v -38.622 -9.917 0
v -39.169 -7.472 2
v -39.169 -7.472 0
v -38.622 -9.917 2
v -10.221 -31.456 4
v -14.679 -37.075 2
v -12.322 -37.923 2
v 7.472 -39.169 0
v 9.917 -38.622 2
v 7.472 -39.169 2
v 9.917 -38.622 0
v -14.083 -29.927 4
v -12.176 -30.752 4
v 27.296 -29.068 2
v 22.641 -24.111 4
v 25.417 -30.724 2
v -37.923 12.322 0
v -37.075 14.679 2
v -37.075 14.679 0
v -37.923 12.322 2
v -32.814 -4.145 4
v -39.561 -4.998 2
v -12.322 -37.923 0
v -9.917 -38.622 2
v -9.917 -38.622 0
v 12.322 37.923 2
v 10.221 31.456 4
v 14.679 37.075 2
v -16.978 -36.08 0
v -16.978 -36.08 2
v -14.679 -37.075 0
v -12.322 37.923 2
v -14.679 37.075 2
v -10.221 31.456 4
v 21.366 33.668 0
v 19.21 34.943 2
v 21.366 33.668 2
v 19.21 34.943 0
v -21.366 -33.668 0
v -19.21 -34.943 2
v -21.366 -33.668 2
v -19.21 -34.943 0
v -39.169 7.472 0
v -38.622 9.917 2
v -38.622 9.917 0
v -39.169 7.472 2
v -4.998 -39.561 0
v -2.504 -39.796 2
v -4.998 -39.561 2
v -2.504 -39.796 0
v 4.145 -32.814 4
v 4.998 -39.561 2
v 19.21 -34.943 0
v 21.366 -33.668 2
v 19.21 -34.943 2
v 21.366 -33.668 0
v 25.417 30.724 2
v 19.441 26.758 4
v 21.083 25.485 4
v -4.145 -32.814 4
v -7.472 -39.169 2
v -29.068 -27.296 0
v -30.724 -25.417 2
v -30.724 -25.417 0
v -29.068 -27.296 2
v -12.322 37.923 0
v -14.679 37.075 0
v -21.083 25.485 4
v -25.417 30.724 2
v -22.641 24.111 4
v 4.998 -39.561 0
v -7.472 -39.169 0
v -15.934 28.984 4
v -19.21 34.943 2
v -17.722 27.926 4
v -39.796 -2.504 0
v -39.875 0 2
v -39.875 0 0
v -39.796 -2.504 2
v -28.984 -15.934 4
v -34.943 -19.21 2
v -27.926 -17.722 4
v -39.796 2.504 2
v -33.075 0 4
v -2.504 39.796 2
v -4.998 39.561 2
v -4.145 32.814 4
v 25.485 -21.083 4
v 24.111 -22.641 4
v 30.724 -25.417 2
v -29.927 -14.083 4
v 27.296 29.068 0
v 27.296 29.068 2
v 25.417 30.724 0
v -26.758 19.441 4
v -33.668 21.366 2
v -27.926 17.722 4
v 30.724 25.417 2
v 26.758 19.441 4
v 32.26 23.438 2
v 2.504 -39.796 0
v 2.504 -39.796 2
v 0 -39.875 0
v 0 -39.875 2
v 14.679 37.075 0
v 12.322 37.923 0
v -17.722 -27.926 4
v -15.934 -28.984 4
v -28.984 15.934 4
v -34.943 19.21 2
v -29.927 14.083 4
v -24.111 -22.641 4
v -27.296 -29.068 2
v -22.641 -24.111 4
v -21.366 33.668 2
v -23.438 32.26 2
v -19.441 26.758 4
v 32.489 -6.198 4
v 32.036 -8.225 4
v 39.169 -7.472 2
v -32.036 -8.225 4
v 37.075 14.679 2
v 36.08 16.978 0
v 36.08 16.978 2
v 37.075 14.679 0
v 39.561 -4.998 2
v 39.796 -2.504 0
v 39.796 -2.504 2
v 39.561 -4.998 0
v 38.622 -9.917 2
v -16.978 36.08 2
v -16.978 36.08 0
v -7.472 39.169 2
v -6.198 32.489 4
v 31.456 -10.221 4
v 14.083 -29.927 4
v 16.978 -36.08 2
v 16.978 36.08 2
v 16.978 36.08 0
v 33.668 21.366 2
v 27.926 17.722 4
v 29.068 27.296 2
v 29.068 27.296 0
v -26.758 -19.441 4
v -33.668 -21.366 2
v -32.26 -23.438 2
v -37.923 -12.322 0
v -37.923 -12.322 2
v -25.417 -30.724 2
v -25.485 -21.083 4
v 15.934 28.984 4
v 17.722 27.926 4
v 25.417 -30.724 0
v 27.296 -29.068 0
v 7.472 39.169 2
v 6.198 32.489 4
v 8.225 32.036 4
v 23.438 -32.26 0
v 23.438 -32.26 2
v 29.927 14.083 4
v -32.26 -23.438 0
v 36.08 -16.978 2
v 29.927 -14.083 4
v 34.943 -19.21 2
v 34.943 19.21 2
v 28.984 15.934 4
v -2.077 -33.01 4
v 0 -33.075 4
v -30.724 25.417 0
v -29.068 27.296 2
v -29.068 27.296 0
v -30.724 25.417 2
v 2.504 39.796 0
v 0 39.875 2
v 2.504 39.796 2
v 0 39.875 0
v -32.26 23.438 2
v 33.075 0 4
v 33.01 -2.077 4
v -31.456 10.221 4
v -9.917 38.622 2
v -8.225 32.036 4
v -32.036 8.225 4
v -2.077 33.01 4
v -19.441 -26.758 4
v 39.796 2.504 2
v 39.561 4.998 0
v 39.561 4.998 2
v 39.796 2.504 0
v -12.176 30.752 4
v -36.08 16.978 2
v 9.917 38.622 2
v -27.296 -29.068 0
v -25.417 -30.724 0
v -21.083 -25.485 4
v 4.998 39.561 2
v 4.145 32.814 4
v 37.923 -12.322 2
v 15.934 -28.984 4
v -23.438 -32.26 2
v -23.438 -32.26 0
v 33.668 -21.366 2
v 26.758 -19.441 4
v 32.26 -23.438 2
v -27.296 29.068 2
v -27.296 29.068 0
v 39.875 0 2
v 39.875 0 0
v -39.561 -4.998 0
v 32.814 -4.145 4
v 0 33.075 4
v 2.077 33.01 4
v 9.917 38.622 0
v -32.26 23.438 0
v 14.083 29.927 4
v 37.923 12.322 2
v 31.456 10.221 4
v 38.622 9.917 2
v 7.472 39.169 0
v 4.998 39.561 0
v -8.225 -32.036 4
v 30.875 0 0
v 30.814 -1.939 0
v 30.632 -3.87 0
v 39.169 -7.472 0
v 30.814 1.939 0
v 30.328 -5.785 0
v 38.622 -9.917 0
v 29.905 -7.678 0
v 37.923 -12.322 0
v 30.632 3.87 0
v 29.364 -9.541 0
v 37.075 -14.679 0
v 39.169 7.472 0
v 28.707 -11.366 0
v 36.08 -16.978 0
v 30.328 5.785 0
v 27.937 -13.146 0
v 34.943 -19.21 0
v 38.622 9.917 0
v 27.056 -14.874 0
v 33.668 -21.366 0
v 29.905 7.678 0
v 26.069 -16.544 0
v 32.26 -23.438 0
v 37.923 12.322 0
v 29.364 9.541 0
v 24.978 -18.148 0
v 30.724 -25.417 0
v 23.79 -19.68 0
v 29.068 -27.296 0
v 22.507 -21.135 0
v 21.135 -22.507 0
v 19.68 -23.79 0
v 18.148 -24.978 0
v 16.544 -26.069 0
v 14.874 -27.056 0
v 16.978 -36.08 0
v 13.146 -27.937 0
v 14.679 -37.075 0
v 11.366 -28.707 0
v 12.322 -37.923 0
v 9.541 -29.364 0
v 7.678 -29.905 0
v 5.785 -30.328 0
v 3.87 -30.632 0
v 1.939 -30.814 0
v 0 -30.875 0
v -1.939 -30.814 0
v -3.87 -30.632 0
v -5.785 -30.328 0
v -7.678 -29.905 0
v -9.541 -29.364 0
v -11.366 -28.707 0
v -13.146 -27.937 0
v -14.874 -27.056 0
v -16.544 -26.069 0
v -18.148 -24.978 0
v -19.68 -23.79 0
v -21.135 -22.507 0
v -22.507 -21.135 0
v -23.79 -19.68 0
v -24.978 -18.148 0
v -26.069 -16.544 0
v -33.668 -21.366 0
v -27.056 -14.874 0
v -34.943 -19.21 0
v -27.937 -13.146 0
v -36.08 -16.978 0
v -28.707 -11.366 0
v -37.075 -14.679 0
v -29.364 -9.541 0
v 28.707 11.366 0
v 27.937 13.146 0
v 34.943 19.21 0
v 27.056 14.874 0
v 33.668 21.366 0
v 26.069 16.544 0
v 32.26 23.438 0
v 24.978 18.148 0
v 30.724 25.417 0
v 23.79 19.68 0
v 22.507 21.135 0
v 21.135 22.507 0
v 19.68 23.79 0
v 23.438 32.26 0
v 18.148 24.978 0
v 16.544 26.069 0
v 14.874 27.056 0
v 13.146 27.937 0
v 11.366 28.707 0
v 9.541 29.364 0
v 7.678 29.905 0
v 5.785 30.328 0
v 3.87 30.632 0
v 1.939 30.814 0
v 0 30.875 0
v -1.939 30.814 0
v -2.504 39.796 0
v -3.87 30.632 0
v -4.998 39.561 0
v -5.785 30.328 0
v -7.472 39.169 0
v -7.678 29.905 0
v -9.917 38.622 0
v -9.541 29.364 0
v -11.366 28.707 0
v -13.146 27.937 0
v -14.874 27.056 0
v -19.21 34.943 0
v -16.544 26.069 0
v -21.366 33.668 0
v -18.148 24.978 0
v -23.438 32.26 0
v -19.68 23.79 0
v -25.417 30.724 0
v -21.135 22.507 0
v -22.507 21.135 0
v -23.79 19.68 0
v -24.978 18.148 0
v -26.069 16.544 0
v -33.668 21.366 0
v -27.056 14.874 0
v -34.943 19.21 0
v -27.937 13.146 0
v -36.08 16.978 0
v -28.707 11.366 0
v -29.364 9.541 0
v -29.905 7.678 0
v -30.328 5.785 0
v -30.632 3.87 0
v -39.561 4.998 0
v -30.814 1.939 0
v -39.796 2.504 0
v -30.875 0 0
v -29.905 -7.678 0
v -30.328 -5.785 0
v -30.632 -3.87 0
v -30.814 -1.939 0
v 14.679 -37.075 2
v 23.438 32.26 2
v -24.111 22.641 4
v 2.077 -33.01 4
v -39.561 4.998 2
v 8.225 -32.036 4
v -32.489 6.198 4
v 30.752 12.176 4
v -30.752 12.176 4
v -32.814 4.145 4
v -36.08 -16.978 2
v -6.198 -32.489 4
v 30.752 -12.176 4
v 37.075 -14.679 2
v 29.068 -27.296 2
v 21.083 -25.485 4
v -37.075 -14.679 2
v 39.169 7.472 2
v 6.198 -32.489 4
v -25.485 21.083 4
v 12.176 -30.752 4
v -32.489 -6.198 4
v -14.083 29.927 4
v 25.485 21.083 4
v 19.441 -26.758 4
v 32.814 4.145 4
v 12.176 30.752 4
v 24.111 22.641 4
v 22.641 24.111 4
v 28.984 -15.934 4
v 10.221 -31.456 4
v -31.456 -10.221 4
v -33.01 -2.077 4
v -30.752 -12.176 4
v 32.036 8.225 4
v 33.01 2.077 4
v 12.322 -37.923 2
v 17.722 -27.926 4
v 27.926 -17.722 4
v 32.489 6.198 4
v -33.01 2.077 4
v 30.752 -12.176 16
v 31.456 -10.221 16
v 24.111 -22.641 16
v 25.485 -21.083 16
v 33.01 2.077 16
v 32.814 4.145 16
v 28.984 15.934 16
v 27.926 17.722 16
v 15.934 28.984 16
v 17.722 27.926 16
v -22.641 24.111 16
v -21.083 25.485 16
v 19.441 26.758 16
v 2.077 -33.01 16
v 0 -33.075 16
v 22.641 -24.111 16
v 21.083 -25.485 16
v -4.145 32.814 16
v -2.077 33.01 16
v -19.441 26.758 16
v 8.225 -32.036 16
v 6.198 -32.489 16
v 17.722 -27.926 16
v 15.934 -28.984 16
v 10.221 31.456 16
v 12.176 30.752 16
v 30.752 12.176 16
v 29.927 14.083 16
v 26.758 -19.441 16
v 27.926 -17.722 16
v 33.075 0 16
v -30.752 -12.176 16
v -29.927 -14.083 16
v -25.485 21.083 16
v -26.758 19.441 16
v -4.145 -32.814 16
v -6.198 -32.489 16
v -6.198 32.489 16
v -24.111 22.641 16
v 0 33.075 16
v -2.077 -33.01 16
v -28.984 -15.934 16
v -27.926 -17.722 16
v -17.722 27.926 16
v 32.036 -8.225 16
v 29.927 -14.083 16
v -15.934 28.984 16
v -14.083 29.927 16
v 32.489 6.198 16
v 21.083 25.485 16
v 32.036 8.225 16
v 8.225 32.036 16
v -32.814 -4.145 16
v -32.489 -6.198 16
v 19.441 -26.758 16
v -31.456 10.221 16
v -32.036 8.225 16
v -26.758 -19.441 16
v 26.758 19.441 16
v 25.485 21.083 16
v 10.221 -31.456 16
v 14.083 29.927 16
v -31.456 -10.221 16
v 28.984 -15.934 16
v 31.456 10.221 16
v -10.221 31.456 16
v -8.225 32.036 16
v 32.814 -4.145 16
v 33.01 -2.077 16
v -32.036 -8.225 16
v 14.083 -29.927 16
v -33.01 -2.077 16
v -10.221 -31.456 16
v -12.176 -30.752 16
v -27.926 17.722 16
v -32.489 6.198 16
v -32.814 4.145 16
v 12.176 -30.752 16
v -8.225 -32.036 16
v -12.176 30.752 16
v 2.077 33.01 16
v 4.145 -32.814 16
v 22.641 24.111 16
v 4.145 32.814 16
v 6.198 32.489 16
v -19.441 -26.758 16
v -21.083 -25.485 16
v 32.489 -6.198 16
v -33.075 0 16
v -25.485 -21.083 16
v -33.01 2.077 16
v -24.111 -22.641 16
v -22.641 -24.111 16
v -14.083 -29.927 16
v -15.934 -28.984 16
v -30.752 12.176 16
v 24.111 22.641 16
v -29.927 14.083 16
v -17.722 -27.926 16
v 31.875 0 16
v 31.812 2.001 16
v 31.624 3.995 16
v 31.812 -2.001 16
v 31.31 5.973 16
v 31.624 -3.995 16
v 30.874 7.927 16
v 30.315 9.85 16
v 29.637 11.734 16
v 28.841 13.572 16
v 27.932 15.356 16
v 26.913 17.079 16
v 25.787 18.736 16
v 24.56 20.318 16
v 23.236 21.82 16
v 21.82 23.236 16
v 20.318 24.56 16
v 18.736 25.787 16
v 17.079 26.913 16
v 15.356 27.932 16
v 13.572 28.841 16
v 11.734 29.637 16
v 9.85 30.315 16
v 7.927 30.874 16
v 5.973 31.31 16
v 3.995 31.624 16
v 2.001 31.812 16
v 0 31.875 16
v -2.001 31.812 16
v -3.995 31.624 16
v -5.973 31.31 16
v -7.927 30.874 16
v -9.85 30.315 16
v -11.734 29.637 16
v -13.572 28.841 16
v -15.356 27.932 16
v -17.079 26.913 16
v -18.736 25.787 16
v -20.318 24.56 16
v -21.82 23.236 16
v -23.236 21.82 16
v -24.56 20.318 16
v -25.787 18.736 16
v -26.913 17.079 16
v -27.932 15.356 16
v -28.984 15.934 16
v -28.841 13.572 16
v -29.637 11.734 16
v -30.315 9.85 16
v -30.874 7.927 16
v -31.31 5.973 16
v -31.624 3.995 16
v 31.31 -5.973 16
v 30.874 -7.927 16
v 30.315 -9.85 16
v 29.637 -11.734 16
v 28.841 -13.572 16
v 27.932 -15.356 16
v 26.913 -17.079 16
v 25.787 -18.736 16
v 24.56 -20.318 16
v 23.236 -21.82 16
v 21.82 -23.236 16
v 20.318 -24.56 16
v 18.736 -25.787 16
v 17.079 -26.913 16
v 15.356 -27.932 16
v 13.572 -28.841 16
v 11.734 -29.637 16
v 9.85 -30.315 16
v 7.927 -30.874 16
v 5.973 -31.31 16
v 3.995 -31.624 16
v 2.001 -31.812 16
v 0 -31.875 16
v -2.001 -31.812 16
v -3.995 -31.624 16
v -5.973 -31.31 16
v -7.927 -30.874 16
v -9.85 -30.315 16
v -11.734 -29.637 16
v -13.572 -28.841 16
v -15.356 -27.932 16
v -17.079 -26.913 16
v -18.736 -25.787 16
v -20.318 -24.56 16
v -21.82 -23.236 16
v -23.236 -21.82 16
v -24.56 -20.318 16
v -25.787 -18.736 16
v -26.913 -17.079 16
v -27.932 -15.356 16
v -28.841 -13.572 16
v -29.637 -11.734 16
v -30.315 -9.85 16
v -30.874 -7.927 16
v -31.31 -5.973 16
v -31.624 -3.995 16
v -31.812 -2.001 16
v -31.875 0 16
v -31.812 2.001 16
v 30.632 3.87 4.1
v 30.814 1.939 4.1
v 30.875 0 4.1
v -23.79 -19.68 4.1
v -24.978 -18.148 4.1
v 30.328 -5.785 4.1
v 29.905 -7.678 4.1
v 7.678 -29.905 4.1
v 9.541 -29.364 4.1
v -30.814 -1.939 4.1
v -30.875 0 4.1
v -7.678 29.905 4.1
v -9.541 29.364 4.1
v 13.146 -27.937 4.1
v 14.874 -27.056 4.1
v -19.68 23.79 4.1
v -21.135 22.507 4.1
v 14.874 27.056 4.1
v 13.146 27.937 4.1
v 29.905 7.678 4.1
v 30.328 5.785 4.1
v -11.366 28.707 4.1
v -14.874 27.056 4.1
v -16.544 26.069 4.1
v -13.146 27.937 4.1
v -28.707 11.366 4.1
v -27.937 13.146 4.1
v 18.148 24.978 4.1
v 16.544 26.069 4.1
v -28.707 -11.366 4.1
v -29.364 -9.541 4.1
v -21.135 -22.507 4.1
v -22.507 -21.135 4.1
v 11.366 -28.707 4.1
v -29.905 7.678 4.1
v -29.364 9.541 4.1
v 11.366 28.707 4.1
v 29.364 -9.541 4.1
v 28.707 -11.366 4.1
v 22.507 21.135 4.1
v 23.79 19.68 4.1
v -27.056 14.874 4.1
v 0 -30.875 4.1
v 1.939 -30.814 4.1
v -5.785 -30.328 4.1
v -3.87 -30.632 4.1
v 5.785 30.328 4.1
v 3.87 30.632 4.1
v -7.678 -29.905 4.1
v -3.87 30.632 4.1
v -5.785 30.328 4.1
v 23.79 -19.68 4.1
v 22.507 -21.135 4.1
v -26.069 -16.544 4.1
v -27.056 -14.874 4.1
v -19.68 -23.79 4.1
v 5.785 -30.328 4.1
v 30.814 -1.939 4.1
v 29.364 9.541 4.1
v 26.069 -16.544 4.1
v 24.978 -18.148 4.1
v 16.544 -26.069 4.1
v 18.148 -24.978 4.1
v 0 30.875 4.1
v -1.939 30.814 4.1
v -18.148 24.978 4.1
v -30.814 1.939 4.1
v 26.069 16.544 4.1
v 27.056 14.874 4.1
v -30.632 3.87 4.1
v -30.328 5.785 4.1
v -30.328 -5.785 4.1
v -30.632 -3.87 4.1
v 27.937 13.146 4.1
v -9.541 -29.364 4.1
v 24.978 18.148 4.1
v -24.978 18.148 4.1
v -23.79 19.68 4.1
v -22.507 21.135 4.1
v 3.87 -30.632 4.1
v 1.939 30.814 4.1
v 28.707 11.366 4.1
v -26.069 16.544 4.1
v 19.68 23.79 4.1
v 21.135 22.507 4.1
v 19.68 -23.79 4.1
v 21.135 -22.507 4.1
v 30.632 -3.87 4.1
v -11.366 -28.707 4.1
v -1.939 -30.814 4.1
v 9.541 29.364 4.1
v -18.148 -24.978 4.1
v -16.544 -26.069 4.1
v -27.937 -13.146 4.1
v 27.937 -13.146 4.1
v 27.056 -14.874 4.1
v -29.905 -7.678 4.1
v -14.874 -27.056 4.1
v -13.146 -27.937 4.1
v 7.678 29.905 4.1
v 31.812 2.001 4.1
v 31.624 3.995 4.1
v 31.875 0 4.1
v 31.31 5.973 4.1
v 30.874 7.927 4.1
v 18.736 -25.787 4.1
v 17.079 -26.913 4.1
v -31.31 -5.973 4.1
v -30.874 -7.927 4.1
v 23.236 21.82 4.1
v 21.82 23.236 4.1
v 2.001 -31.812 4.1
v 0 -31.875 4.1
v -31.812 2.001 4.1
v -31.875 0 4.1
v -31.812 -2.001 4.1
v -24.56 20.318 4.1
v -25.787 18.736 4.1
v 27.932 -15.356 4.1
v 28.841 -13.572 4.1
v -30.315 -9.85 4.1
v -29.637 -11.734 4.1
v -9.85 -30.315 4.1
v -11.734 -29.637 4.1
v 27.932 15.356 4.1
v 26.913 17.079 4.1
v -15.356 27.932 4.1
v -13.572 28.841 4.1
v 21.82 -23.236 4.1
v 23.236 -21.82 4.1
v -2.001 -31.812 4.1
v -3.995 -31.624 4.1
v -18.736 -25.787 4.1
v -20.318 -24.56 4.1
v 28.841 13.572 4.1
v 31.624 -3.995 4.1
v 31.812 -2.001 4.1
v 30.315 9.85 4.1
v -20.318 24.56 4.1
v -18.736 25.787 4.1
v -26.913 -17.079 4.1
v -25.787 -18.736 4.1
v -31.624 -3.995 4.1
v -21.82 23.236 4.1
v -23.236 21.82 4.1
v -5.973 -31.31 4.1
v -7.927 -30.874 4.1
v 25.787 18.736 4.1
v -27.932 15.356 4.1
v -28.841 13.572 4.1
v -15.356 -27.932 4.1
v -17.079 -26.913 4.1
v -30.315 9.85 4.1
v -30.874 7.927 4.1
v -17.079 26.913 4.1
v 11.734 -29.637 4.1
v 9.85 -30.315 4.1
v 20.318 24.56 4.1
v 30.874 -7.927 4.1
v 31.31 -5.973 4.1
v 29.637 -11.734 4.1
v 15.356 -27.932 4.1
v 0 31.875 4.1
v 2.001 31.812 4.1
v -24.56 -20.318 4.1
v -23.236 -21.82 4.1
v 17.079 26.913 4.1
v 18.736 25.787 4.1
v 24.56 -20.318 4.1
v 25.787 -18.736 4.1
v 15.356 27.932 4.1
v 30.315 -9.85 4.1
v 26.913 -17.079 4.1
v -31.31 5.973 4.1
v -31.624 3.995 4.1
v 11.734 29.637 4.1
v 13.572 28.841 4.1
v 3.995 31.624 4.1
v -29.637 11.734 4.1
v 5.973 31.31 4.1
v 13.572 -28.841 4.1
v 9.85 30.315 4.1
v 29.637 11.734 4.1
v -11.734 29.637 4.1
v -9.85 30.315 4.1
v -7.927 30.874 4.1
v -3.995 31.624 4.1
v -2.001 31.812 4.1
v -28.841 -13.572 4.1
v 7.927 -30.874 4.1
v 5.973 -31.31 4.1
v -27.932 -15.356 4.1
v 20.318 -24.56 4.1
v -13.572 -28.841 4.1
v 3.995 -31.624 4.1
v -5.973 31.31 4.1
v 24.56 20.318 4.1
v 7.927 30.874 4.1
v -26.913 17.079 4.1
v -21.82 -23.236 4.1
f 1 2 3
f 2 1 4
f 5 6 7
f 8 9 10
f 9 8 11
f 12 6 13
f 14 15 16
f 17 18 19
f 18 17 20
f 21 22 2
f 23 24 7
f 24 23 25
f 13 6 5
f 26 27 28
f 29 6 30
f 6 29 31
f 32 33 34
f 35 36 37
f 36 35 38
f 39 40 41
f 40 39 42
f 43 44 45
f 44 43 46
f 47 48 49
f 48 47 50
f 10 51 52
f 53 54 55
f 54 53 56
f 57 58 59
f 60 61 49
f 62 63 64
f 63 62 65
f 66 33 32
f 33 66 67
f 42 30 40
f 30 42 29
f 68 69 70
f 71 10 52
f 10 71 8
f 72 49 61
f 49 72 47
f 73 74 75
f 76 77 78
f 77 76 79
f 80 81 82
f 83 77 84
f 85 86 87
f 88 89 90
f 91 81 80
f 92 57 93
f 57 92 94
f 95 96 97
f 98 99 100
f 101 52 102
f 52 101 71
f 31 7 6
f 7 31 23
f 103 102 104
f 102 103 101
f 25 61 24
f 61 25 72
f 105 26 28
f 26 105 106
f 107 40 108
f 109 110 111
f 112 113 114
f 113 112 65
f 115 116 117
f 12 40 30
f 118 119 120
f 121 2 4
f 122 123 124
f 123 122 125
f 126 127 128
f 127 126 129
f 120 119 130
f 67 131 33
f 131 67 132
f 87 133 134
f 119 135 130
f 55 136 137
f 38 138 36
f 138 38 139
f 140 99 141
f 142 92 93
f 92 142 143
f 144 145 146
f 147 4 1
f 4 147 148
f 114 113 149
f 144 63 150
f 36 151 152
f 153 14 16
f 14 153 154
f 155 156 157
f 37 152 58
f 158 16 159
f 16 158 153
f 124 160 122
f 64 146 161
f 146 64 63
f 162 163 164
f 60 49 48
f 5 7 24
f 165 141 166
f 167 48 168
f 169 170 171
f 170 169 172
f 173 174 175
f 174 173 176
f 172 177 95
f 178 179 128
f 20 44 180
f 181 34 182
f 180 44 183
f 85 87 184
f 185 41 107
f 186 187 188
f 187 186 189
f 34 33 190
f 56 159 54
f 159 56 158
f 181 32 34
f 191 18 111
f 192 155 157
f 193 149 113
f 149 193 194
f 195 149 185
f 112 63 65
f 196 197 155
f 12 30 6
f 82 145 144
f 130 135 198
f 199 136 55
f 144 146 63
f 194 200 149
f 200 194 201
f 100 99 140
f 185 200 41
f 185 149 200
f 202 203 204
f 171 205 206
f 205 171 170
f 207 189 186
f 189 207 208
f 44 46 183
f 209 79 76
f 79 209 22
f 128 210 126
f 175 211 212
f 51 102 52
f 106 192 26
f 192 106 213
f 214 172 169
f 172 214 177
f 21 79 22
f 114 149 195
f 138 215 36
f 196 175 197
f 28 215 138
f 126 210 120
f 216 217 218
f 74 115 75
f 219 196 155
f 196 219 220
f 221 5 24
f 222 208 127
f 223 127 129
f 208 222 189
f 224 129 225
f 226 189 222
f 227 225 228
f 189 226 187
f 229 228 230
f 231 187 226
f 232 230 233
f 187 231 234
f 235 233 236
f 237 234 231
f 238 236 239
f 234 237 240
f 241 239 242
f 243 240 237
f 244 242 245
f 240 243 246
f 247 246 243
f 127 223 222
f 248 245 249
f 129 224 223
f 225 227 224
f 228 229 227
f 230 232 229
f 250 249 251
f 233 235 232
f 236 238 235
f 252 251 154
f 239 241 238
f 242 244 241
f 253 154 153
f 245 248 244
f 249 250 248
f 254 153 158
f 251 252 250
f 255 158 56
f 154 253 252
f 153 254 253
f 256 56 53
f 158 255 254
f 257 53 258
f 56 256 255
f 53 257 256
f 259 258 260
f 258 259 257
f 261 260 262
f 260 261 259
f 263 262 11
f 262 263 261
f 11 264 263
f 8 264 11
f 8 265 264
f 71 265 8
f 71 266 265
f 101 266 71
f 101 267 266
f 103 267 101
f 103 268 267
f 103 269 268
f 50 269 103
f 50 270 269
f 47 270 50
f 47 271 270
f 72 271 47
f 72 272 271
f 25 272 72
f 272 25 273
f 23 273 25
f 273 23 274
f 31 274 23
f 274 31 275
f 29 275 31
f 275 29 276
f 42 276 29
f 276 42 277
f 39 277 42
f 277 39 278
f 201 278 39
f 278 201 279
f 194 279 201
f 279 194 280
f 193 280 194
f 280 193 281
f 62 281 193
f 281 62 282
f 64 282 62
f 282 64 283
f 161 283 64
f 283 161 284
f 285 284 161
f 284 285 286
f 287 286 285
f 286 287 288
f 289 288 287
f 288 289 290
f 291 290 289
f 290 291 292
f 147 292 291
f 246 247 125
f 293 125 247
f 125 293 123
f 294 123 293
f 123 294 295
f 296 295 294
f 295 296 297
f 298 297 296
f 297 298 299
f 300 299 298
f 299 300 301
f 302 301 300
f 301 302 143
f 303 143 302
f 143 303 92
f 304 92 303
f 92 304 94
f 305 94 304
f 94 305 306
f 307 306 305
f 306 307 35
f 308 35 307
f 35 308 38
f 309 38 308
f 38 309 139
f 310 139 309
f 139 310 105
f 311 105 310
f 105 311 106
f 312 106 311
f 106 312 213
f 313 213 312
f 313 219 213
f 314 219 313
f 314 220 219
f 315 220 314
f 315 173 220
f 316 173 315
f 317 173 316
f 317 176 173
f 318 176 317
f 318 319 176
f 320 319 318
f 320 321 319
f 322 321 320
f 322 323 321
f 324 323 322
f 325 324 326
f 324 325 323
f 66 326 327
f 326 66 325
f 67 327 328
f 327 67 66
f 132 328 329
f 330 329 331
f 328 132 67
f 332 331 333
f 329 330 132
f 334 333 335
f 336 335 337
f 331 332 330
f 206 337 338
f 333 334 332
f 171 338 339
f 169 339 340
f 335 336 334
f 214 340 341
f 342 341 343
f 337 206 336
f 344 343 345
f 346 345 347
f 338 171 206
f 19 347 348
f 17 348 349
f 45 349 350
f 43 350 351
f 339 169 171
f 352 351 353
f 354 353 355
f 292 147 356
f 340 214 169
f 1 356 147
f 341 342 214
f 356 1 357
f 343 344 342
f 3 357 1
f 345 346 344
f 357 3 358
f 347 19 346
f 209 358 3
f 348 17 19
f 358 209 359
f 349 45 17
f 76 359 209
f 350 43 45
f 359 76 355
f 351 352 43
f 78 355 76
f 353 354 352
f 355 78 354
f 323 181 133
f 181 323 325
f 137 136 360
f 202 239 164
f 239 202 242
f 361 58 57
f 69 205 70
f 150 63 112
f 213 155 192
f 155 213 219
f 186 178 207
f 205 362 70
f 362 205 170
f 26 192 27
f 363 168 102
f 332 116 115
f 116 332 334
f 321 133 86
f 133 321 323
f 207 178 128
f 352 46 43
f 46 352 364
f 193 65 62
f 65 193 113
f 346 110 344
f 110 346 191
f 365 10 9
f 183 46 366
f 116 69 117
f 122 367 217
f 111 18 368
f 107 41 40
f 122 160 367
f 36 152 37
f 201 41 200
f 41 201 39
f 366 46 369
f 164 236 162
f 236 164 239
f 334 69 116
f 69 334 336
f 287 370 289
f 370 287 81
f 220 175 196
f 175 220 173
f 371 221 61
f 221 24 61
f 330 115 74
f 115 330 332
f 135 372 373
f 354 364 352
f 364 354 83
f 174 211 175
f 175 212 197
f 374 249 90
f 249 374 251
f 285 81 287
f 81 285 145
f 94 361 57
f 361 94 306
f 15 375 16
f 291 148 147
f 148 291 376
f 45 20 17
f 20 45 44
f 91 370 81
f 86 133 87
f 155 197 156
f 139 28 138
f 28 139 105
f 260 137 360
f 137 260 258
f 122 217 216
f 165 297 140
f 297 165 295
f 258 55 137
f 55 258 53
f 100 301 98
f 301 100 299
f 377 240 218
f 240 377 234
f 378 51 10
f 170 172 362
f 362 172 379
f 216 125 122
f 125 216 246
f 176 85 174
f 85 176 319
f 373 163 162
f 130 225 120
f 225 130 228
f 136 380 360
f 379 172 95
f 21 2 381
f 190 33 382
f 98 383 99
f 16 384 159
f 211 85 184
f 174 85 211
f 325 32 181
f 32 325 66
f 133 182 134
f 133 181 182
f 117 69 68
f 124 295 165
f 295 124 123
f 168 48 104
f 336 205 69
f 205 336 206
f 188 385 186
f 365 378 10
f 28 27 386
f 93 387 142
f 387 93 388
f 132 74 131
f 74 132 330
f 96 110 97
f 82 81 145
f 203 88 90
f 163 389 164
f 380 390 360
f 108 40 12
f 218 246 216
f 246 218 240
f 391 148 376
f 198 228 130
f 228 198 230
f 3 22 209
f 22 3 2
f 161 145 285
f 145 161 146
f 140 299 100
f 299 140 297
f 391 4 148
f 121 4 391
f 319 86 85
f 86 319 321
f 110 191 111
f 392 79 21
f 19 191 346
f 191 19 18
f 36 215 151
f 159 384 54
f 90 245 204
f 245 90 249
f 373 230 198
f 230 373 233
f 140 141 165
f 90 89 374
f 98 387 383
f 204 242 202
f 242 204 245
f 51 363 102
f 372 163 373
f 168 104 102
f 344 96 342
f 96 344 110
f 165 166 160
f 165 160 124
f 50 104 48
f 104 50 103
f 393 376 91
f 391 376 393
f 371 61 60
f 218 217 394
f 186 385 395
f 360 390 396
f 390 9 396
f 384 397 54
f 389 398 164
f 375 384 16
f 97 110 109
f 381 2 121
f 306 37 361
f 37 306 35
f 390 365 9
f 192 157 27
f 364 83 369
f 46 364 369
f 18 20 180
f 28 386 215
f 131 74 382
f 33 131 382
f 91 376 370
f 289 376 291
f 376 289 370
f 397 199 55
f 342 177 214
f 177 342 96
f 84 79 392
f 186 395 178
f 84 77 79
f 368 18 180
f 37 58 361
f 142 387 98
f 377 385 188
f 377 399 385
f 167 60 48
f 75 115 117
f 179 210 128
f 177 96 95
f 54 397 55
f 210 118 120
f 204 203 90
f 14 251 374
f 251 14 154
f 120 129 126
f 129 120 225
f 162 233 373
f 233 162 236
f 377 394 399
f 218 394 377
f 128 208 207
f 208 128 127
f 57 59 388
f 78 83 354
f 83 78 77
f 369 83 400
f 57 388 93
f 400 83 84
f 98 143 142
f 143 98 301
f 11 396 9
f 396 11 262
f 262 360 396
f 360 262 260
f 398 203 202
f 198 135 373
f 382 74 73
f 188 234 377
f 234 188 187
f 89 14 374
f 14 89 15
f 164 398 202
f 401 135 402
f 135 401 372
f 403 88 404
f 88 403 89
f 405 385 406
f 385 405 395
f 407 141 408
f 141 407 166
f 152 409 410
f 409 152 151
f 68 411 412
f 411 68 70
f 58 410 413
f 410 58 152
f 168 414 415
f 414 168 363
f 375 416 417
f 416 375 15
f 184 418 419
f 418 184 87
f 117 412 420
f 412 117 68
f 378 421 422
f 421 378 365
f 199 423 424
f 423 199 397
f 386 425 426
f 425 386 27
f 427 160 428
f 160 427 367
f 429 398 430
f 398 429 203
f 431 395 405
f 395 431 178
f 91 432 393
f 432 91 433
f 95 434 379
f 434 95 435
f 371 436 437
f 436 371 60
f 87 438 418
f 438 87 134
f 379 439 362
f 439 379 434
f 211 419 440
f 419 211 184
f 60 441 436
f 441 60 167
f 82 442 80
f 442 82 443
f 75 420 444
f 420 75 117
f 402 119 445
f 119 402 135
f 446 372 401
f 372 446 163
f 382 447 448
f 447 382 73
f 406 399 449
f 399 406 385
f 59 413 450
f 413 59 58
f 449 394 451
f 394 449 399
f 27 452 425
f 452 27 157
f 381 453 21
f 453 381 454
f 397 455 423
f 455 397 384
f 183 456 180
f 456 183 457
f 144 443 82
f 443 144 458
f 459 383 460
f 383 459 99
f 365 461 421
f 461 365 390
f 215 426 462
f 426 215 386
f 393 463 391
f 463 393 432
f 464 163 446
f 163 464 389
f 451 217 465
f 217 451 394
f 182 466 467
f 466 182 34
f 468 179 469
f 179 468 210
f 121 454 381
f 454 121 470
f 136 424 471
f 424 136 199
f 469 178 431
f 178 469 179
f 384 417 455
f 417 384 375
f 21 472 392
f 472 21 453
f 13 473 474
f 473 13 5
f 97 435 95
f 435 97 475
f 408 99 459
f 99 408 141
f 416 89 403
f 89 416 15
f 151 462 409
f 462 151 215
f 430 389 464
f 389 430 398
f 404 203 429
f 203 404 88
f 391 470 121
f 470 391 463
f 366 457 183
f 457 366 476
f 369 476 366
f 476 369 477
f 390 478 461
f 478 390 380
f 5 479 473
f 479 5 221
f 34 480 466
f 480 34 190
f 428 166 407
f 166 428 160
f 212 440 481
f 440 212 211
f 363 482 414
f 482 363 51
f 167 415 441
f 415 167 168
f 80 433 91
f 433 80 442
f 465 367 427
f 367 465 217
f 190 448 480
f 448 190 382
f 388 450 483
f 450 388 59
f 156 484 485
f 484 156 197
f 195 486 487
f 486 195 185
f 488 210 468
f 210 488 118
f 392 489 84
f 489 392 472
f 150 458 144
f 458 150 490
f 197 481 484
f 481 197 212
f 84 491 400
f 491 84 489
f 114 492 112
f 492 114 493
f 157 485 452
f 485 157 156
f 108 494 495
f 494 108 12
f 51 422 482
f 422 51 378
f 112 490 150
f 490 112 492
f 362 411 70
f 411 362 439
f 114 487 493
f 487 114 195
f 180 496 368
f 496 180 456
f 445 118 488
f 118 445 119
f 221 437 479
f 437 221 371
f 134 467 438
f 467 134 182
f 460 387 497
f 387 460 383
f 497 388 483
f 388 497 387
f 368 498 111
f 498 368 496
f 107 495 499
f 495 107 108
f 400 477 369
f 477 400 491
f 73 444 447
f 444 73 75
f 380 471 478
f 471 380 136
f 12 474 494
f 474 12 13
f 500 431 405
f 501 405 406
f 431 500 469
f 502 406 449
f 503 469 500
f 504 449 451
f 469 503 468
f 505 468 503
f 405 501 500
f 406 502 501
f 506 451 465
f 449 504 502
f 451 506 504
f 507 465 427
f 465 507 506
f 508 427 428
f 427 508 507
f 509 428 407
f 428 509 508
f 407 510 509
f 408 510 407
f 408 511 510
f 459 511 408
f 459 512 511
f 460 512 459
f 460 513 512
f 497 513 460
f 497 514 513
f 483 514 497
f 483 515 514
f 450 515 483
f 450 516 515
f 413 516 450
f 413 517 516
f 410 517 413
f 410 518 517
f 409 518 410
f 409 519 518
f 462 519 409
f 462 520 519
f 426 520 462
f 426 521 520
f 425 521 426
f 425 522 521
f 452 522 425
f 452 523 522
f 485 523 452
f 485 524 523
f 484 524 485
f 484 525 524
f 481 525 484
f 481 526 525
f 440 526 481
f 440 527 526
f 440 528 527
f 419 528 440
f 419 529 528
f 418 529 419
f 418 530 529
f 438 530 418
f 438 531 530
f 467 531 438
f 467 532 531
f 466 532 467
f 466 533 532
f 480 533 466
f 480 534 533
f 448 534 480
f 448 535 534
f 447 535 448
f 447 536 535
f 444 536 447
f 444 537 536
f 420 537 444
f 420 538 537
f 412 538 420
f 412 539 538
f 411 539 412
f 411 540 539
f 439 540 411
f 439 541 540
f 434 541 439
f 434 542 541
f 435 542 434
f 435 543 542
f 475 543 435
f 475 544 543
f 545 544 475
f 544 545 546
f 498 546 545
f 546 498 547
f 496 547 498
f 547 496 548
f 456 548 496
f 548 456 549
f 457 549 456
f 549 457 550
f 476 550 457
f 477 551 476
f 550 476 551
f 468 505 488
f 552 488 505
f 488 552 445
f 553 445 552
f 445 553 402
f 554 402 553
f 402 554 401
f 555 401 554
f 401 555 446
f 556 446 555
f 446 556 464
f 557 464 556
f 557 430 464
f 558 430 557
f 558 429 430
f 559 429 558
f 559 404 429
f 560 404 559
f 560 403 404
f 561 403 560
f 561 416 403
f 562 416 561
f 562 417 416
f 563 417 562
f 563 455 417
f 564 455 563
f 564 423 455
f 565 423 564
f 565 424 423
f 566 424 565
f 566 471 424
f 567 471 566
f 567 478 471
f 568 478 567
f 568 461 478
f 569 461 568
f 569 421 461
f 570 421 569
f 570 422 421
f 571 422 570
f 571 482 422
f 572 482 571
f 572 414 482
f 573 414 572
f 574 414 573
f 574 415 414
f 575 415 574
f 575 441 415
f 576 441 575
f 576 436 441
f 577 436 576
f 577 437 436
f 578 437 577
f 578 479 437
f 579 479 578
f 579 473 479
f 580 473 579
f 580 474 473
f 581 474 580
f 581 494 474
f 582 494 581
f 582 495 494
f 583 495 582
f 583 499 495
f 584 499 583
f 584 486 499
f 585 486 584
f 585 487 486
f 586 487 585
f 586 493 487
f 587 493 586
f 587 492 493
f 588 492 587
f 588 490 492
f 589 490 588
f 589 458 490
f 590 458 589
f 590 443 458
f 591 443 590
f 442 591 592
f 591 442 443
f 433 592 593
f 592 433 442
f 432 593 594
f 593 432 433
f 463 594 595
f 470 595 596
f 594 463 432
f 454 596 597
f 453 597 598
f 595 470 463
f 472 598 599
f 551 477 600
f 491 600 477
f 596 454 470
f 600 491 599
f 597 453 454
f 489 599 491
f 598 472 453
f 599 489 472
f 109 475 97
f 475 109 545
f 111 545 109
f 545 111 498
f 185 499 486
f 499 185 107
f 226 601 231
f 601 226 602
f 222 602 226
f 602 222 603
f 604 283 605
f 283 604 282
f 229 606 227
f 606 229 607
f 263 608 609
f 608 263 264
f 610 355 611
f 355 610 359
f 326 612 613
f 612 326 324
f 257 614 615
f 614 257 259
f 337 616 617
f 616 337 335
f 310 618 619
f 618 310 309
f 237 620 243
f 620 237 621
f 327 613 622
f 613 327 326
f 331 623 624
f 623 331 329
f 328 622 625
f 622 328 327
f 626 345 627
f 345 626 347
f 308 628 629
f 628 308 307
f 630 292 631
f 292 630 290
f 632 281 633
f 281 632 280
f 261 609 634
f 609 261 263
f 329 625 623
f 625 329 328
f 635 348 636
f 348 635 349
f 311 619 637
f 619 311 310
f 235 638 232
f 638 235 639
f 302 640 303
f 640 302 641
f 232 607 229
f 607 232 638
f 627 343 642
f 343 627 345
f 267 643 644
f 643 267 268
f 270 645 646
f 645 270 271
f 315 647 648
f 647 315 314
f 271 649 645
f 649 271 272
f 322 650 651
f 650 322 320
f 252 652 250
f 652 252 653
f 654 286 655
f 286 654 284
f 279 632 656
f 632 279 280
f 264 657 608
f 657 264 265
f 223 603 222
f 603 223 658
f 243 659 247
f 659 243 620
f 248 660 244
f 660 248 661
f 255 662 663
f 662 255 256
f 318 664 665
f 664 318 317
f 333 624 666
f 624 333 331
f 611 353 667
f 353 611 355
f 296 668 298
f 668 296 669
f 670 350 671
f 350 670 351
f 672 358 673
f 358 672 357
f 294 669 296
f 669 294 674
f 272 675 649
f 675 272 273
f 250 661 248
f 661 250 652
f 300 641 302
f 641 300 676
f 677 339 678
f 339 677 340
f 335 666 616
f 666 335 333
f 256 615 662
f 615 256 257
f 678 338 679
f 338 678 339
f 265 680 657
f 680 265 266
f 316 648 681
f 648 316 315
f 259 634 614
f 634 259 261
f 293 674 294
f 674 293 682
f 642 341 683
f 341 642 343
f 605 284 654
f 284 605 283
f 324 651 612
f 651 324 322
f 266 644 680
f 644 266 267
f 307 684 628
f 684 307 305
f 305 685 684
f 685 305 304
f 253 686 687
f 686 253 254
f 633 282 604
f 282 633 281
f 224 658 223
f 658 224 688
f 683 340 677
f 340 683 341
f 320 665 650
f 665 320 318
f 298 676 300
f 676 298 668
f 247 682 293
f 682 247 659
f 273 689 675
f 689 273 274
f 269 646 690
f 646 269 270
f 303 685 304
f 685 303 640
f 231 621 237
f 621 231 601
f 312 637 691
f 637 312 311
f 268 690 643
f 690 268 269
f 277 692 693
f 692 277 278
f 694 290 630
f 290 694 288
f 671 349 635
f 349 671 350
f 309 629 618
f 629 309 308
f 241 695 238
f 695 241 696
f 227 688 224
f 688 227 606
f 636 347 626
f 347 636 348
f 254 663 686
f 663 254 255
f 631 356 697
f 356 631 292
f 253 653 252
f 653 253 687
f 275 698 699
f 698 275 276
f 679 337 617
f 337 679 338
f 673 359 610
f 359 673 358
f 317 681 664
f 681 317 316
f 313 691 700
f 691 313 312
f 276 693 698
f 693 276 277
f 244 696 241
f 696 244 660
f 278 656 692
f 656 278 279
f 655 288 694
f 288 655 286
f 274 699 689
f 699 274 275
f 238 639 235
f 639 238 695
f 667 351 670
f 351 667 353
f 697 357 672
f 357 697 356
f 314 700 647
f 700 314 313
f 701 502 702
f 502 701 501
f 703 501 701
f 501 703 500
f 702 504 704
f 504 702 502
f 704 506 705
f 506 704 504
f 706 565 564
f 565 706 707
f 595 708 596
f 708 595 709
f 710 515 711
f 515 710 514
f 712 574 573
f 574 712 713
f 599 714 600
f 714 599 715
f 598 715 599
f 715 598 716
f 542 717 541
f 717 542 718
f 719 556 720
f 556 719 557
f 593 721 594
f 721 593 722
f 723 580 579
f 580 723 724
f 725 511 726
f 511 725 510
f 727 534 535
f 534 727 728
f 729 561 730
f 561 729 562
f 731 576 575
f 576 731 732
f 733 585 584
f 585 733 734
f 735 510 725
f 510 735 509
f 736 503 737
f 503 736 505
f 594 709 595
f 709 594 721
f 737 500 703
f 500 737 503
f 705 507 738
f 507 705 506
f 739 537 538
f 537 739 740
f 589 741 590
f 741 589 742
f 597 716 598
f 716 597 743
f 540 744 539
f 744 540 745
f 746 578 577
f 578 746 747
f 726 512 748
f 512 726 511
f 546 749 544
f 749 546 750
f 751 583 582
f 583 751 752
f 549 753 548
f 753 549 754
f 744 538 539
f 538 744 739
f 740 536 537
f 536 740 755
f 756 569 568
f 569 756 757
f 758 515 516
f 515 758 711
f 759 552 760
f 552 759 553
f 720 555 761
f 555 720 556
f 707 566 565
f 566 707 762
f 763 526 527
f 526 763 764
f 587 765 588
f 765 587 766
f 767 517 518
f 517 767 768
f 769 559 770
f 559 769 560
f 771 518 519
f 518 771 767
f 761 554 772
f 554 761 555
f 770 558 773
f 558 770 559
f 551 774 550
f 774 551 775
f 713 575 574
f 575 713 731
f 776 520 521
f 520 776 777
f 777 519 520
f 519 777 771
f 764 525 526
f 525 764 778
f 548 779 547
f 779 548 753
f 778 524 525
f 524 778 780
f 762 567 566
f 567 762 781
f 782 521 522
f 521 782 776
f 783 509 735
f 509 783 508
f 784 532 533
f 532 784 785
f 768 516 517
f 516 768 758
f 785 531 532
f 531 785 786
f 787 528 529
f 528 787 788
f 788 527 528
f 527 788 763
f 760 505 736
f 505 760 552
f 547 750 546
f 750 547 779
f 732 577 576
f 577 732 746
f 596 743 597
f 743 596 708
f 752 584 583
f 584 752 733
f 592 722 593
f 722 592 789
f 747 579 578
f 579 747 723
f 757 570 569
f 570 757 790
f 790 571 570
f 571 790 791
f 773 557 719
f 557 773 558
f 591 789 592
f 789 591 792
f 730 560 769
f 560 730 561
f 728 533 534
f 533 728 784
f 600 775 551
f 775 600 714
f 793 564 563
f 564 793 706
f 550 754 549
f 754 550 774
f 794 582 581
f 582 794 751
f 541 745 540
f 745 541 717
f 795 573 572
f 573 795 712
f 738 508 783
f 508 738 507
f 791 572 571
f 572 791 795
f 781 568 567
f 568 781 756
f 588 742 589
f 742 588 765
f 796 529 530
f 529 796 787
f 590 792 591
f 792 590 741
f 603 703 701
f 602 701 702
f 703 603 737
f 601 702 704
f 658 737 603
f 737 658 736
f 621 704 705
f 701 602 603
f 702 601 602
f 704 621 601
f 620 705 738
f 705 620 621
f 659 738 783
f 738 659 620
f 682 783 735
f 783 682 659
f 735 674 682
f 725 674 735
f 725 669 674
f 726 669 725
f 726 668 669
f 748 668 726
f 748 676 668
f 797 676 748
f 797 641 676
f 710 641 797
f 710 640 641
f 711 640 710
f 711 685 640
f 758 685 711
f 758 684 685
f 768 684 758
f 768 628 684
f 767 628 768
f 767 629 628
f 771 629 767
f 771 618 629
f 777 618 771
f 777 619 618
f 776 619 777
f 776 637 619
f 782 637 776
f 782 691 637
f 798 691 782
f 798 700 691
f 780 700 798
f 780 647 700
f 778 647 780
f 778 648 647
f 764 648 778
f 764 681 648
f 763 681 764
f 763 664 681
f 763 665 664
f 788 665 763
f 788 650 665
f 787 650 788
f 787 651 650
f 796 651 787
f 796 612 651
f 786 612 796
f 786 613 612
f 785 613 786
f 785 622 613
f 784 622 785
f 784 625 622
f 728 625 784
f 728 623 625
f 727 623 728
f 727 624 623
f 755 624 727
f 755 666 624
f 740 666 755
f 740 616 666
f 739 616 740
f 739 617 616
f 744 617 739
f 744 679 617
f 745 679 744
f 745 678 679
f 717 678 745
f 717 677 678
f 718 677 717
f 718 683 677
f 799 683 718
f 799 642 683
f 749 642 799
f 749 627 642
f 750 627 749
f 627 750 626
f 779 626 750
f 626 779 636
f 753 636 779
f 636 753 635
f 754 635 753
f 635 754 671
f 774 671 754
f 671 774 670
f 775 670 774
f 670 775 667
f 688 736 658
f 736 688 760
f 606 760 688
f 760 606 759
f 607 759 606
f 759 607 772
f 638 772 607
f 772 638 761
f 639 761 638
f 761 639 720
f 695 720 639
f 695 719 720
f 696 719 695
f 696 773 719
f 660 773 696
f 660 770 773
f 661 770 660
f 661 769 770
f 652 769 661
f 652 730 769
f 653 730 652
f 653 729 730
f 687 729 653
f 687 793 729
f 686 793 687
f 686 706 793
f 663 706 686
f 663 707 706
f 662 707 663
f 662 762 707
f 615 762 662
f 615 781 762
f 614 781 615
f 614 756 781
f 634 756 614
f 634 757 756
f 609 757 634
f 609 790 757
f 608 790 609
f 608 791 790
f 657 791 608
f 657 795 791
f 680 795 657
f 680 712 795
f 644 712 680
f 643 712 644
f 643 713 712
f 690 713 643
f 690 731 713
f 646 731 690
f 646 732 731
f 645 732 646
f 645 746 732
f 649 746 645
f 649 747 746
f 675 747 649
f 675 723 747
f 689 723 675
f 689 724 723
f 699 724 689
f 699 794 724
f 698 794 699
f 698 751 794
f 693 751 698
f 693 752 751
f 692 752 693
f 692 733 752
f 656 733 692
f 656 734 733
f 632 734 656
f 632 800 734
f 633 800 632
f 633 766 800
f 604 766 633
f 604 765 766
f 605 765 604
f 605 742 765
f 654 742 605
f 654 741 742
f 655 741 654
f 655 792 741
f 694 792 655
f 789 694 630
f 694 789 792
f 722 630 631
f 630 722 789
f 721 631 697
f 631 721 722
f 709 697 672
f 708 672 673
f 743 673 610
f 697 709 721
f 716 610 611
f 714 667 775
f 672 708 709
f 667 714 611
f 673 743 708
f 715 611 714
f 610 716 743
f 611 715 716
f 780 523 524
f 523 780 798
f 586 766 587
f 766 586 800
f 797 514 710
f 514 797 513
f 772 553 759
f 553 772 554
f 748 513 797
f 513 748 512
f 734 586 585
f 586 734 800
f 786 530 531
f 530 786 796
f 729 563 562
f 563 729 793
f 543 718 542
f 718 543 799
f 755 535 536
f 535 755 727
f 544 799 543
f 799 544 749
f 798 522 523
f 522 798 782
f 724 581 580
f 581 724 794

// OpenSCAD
$fn=100;

// Tuned for Bushness Powerview compact folding binoculars
sm_filter_id=30;
sm_filter_h=10;
sm_filter_flare=7.6;
sm_cuff_id=33;
sm_cuff_h=9.75;
sm_cuff_wall=0.8;

// Tuned for Celestron Cometron 7x50 binoculars
lg_cuff_id=44;
lg_cuff_h=18;
lg_filter_id=63.75;
lg_filter_h=12;
lg_filter_flare=16;
lg_cuff_wall=1.2;

// -----------------------------------------------------------------
// The parameter below are a little more "set in stone" relative
// to the fit of a picam board, etc.
// -----------------------------------------------------------------


side=25.5;
cuff_wall=4.25;

post_r=0.75;
post_shoulder_r=1.5;
post_shoulder_h=2.5;

posts_x=[2+post_r, 14.5+post_r];
posts_y=[2+post_r, 22.5+post_r];

wall=0.8;
conn_shoulder=2.5;
fillet=2;

base_carve_side=29;
base_carve_h=5.5;

cam_lens_d=8.25;
cam_lens_xoff=wall+16.5;
cam_lens_yoff=wall+base_carve_side/2;

cam_carve_h=3.5-wall;
cam_carve_y=11;
cam_carve_x=22.5;

chip_carve_yoff=9.5;
chip_carve_h=1.75;
chip_carve_y=14;
chip_carve_x=11.25;

// The front is the side that has the opening for the camera
// The board actually fixes to the back, then the whole
// thing press-fits into the front.
//
// This is combined into the cuff, so not all that useful on
// its own.
module front(ymax=base_carve_side+2*wall, yoff=0){
    difference(){
        hull(){
            for(x=[fillet,base_carve_side+2*wall-fillet], 
                y=[fillet,ymax-fillet]){
                translate([x,y,0])
                    cylinder(r=fillet,h=cuff_wall+chip_carve_h+cam_carve_h+2*wall);
            }
        }
        
        translate([0,yoff,0])
        union(){
            carve_off=(base_carve_side-1.01*side)/2;
            translate([carve_off, carve_off, chip_carve_h+cam_carve_h])
            scale([1.01, 1.01, 1.25])
                back_blank();

            translate([base_carve_side-0.1, 
                       1.25*wall+carve_off+conn_shoulder, 
                       chip_carve_h+cam_carve_h+wall])
                cube([2*carve_off, side-2*conn_shoulder, cuff_wall+2*wall+0.2]);
            
            translate([wall, chip_carve_yoff, cam_carve_h])
                cube([cam_carve_x, chip_carve_y, chip_carve_h+.2]);
            
            translate([wall, chip_carve_yoff, wall])
                cube([cam_carve_x, cam_carve_y, cam_carve_h]);
            
            translate([cam_lens_xoff, cam_lens_yoff, -0.1])
                cylinder(d=cam_lens_d, h=wall+0.2);
        }
    }
}

module back_blank(){
    hull(){
        for(x=[fillet,side], y=[fillet,side]){
            translate([x,y,0])
                cylinder(r=fillet,h=cuff_wall+wall+0.2);
        }
    }
}

// This is the back, where the picam board actually affixes.
// This IS NOT changed depending on cuff size.
module back(){
    union(){
        difference(){
            back_blank();
            translate([wall, wall, wall+0.1])
                cube([side, side, cuff_wall+0.2]);
            translate([side+wall-0.1, wall+conn_shoulder, 2*wall])
                cube([wall+0.2, side-2*conn_shoulder, cuff_wall+0.2]);
        }
        
        for(x=posts_x, y=posts_y){
            translate([wall+x, wall+y, wall])
            union(){
                cylinder(r1=1.5*post_shoulder_r, r2=post_shoulder_r, h=post_shoulder_h);
                translate([0,0,post_shoulder_h])
                    cylinder(r=post_r, h=cuff_wall-post_shoulder_h);
            }
        }
    }
}

// This is the part that sleeves over the binocular eyepiece, and
// integrates the front of the picam case
module pinocs_cuff(id=sm_cuff_id, cuff_h=sm_cuff_h, cuff_wall=sm_cuff_wall){
    ymax=base_carve_side+2*wall;
    yoff=0;
    
    cuff_zoff=cuff_h+4.75;
    
    union(){
        difference(){
            union(){
                hull(){
                    for(x=[fillet,base_carve_side+2*wall-fillet], 
                        y=[fillet,ymax-fillet]){
                        translate([x,y,0])
                            cylinder(r=fillet,h=cuff_wall+chip_carve_h+cam_carve_h+2*wall);
                    }
                    
                    translate([cam_lens_xoff, cam_lens_yoff, -5.5])
                        cylinder(d=id+2*cuff_wall,h=5.75);
                }
                
                translate([cam_lens_xoff, cam_lens_yoff, -cuff_zoff])
                    cylinder(d=id+2*cuff_wall,h=cuff_h);
            }
            
            translate([0,yoff,0])
            union(){
                carve_off=(base_carve_side-1.01*side)/2;
                translate([carve_off, carve_off, chip_carve_h+cam_carve_h])
                scale([1.01, 1.01, 1.25])
                    back_blank();

                translate([base_carve_side-0.1, 
                           1.25*wall+carve_off+conn_shoulder, 
                           chip_carve_h+cam_carve_h+wall])
                    cube([3*carve_off, side-2*conn_shoulder, cuff_wall+2*wall+0.2]);
                
                translate([wall, chip_carve_yoff, cam_carve_h])
                    cube([cam_carve_x, chip_carve_y, chip_carve_h+.2]);
                
                translate([wall, chip_carve_yoff, wall])
                    cube([cam_carve_x, cam_carve_y, cam_carve_h]);
                
                translate([cam_lens_xoff, cam_lens_yoff, -0.1])
                    cylinder(d=cam_lens_d, h=wall+0.2);
            }
            
            translate([cam_lens_xoff, cam_lens_yoff,-cuff_zoff-0.1])
            union(){
                cylinder(d=id,h=cuff_zoff+0.2);
                cylinder(d=cam_lens_d, h=cuff_zoff+2.5);
            }
        }
        
        translate([cam_lens_xoff, cam_lens_yoff, -cuff_zoff-0.1])
        intersection(){
            cylinder(d=id-2*cuff_wall,h=cuff_zoff+0.5);
            
            translate([-id/2-cuff_wall, -id/2-cuff_wall, 0])
            for(n=[0:100]){
                translate([n*3.5-2,0,0])
                    cube([cuff_wall,id+cuff_wall,cuff_zoff+0.25]);
                translate([0,n*3.5-2,0])
                    cube([id+1,cuff_wall,1]);
            }
        }
    }
}

// This is the cuff part of the filter that fits over the front
// of the binoculars, and forms the frame for mounting the solar filter film.
module pinoc_filter(id=sm_filter_id, cuff_h=sm_filter_h, cuff_wall=sm_cuff_wall, filter_flare=sm_filter_flare){
    filter_d=id+filter_flare;
    
    difference(){
        union(){
            hull(){
                cylinder(d=filter_d,h=2);
                translate([0,0,2])
                    cylinder(d=id+2*cuff_wall,h=2);
            }
            translate([0,0,4])
            cylinder(d=id+2*cuff_wall,h=cuff_h);
        }
        translate([0,0,-0.1])
        union(){
            cylinder(d=id-2,h=7);
            translate([0,0,4.2])
                cylinder(d=id,h=cuff_h+0.2);
        }
    }
}

// This is the cap that traps the solar filter film against the pinoc_filter
// base frame. Hot gluing the filter and cap and frame together is a good idea.
module pinoc_filter_ring(id=sm_filter_id, cuff_wall=sm_cuff_wall, filter_flare=sm_filter_flare){
    difference(){
        cylinder(d=id+filter_flare+2*cuff_wall, h=6);
        translate([0,0,-0.1])
            cylinder(d=id, h=6.2);
        translate([0,0,2-0.1])
            cylinder(d=id+filter_flare, h=6.2);
    }
}

//back();
//front();

//pinocs_cuff();
//pinocs_cuff(lg_cuff_id, lg_cuff_h, lg_cuff_wall);
//pinoc_filter();
//pinoc_filter_ring();

pinoc_filter(lg_filter_id, lg_filter_h, lg_cuff_wall, lg_filter_flare);
//pinoc_filter_ring(lg_filter_id, lg_cuff_wall, lg_filter_flare);
